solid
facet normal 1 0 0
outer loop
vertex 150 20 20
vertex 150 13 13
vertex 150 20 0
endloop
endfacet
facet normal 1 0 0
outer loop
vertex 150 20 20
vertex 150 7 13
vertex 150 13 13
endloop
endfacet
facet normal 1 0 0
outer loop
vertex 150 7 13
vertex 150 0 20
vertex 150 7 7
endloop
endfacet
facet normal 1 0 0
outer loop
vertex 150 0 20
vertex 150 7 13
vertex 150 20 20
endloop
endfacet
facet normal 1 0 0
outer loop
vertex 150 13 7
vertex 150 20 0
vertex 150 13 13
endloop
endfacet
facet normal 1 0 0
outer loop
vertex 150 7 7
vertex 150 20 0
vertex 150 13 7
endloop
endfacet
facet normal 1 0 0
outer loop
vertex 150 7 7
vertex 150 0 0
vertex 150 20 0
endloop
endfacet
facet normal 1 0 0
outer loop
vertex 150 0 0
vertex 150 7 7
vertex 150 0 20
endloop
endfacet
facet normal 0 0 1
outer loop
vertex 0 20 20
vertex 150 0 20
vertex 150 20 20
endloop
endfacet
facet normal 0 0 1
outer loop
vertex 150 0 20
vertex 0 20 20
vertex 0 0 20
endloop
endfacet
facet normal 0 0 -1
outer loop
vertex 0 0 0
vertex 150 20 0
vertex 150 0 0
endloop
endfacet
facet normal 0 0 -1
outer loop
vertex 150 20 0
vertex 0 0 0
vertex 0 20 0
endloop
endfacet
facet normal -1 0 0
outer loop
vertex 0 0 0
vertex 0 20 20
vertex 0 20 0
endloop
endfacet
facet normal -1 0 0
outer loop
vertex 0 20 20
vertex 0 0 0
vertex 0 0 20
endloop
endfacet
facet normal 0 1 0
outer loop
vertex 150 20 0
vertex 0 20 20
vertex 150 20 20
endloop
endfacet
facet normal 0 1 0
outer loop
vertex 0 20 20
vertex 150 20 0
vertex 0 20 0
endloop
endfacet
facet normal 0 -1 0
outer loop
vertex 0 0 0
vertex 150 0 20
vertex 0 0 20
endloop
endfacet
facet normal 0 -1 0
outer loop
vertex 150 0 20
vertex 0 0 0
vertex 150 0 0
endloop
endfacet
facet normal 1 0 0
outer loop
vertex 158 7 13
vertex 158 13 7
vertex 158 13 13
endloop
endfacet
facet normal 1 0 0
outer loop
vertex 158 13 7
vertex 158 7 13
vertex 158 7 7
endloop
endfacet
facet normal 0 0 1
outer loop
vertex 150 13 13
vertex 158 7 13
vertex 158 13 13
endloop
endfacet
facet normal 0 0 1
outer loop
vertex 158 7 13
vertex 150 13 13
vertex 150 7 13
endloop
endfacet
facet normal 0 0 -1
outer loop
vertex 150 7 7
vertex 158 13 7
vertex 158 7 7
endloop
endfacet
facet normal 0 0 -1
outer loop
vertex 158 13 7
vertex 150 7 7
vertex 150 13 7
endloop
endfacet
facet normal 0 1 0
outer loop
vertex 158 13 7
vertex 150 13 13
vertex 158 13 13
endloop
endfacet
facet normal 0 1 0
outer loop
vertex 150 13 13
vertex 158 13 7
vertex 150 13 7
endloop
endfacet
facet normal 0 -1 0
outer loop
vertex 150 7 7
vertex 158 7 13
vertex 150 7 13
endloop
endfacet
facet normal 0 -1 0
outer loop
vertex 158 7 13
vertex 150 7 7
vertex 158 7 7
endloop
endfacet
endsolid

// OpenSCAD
// Split-for-bed: two bodies with an alignment pin/socket.
// Units: millimetres. Never scale the part to fit the envelope.
// Copy into the project and set which="a" or which="b" for export.

bar_length_mm = 300;
bar_width_mm = 20;
bar_height_mm = 20;
clearance_per_side_mm = 0.2;
pin_len_mm = 8;
pin_w_mm = 6;
which = "a";  // "a" | "b"
$fn = 32;
eps = 0.02;

half_mm = bar_length_mm / 2;
pin_clear_mm = pin_w_mm + 2 * clearance_per_side_mm;

module bar_half() {
  cube([half_mm, bar_width_mm, bar_height_mm]);
}

module pin() {
  translate([
    half_mm - eps,
    (bar_width_mm - pin_w_mm) / 2,
    (bar_height_mm - pin_w_mm) / 2
  ])
    cube([pin_len_mm + eps, pin_w_mm, pin_w_mm]);
}

module socket() {
  translate([
    -eps,
    (bar_width_mm - pin_clear_mm) / 2,
    (bar_height_mm - pin_clear_mm) / 2
  ])
    cube([pin_len_mm + 2 * eps, pin_clear_mm, pin_clear_mm]);
}

module body_a() {
  union() {
    bar_half();
    pin();
  }
}

module body_b() {
  difference() {
    bar_half();
    socket();
  }
}

if (which == "a")
  body_a();
else
  body_b();
